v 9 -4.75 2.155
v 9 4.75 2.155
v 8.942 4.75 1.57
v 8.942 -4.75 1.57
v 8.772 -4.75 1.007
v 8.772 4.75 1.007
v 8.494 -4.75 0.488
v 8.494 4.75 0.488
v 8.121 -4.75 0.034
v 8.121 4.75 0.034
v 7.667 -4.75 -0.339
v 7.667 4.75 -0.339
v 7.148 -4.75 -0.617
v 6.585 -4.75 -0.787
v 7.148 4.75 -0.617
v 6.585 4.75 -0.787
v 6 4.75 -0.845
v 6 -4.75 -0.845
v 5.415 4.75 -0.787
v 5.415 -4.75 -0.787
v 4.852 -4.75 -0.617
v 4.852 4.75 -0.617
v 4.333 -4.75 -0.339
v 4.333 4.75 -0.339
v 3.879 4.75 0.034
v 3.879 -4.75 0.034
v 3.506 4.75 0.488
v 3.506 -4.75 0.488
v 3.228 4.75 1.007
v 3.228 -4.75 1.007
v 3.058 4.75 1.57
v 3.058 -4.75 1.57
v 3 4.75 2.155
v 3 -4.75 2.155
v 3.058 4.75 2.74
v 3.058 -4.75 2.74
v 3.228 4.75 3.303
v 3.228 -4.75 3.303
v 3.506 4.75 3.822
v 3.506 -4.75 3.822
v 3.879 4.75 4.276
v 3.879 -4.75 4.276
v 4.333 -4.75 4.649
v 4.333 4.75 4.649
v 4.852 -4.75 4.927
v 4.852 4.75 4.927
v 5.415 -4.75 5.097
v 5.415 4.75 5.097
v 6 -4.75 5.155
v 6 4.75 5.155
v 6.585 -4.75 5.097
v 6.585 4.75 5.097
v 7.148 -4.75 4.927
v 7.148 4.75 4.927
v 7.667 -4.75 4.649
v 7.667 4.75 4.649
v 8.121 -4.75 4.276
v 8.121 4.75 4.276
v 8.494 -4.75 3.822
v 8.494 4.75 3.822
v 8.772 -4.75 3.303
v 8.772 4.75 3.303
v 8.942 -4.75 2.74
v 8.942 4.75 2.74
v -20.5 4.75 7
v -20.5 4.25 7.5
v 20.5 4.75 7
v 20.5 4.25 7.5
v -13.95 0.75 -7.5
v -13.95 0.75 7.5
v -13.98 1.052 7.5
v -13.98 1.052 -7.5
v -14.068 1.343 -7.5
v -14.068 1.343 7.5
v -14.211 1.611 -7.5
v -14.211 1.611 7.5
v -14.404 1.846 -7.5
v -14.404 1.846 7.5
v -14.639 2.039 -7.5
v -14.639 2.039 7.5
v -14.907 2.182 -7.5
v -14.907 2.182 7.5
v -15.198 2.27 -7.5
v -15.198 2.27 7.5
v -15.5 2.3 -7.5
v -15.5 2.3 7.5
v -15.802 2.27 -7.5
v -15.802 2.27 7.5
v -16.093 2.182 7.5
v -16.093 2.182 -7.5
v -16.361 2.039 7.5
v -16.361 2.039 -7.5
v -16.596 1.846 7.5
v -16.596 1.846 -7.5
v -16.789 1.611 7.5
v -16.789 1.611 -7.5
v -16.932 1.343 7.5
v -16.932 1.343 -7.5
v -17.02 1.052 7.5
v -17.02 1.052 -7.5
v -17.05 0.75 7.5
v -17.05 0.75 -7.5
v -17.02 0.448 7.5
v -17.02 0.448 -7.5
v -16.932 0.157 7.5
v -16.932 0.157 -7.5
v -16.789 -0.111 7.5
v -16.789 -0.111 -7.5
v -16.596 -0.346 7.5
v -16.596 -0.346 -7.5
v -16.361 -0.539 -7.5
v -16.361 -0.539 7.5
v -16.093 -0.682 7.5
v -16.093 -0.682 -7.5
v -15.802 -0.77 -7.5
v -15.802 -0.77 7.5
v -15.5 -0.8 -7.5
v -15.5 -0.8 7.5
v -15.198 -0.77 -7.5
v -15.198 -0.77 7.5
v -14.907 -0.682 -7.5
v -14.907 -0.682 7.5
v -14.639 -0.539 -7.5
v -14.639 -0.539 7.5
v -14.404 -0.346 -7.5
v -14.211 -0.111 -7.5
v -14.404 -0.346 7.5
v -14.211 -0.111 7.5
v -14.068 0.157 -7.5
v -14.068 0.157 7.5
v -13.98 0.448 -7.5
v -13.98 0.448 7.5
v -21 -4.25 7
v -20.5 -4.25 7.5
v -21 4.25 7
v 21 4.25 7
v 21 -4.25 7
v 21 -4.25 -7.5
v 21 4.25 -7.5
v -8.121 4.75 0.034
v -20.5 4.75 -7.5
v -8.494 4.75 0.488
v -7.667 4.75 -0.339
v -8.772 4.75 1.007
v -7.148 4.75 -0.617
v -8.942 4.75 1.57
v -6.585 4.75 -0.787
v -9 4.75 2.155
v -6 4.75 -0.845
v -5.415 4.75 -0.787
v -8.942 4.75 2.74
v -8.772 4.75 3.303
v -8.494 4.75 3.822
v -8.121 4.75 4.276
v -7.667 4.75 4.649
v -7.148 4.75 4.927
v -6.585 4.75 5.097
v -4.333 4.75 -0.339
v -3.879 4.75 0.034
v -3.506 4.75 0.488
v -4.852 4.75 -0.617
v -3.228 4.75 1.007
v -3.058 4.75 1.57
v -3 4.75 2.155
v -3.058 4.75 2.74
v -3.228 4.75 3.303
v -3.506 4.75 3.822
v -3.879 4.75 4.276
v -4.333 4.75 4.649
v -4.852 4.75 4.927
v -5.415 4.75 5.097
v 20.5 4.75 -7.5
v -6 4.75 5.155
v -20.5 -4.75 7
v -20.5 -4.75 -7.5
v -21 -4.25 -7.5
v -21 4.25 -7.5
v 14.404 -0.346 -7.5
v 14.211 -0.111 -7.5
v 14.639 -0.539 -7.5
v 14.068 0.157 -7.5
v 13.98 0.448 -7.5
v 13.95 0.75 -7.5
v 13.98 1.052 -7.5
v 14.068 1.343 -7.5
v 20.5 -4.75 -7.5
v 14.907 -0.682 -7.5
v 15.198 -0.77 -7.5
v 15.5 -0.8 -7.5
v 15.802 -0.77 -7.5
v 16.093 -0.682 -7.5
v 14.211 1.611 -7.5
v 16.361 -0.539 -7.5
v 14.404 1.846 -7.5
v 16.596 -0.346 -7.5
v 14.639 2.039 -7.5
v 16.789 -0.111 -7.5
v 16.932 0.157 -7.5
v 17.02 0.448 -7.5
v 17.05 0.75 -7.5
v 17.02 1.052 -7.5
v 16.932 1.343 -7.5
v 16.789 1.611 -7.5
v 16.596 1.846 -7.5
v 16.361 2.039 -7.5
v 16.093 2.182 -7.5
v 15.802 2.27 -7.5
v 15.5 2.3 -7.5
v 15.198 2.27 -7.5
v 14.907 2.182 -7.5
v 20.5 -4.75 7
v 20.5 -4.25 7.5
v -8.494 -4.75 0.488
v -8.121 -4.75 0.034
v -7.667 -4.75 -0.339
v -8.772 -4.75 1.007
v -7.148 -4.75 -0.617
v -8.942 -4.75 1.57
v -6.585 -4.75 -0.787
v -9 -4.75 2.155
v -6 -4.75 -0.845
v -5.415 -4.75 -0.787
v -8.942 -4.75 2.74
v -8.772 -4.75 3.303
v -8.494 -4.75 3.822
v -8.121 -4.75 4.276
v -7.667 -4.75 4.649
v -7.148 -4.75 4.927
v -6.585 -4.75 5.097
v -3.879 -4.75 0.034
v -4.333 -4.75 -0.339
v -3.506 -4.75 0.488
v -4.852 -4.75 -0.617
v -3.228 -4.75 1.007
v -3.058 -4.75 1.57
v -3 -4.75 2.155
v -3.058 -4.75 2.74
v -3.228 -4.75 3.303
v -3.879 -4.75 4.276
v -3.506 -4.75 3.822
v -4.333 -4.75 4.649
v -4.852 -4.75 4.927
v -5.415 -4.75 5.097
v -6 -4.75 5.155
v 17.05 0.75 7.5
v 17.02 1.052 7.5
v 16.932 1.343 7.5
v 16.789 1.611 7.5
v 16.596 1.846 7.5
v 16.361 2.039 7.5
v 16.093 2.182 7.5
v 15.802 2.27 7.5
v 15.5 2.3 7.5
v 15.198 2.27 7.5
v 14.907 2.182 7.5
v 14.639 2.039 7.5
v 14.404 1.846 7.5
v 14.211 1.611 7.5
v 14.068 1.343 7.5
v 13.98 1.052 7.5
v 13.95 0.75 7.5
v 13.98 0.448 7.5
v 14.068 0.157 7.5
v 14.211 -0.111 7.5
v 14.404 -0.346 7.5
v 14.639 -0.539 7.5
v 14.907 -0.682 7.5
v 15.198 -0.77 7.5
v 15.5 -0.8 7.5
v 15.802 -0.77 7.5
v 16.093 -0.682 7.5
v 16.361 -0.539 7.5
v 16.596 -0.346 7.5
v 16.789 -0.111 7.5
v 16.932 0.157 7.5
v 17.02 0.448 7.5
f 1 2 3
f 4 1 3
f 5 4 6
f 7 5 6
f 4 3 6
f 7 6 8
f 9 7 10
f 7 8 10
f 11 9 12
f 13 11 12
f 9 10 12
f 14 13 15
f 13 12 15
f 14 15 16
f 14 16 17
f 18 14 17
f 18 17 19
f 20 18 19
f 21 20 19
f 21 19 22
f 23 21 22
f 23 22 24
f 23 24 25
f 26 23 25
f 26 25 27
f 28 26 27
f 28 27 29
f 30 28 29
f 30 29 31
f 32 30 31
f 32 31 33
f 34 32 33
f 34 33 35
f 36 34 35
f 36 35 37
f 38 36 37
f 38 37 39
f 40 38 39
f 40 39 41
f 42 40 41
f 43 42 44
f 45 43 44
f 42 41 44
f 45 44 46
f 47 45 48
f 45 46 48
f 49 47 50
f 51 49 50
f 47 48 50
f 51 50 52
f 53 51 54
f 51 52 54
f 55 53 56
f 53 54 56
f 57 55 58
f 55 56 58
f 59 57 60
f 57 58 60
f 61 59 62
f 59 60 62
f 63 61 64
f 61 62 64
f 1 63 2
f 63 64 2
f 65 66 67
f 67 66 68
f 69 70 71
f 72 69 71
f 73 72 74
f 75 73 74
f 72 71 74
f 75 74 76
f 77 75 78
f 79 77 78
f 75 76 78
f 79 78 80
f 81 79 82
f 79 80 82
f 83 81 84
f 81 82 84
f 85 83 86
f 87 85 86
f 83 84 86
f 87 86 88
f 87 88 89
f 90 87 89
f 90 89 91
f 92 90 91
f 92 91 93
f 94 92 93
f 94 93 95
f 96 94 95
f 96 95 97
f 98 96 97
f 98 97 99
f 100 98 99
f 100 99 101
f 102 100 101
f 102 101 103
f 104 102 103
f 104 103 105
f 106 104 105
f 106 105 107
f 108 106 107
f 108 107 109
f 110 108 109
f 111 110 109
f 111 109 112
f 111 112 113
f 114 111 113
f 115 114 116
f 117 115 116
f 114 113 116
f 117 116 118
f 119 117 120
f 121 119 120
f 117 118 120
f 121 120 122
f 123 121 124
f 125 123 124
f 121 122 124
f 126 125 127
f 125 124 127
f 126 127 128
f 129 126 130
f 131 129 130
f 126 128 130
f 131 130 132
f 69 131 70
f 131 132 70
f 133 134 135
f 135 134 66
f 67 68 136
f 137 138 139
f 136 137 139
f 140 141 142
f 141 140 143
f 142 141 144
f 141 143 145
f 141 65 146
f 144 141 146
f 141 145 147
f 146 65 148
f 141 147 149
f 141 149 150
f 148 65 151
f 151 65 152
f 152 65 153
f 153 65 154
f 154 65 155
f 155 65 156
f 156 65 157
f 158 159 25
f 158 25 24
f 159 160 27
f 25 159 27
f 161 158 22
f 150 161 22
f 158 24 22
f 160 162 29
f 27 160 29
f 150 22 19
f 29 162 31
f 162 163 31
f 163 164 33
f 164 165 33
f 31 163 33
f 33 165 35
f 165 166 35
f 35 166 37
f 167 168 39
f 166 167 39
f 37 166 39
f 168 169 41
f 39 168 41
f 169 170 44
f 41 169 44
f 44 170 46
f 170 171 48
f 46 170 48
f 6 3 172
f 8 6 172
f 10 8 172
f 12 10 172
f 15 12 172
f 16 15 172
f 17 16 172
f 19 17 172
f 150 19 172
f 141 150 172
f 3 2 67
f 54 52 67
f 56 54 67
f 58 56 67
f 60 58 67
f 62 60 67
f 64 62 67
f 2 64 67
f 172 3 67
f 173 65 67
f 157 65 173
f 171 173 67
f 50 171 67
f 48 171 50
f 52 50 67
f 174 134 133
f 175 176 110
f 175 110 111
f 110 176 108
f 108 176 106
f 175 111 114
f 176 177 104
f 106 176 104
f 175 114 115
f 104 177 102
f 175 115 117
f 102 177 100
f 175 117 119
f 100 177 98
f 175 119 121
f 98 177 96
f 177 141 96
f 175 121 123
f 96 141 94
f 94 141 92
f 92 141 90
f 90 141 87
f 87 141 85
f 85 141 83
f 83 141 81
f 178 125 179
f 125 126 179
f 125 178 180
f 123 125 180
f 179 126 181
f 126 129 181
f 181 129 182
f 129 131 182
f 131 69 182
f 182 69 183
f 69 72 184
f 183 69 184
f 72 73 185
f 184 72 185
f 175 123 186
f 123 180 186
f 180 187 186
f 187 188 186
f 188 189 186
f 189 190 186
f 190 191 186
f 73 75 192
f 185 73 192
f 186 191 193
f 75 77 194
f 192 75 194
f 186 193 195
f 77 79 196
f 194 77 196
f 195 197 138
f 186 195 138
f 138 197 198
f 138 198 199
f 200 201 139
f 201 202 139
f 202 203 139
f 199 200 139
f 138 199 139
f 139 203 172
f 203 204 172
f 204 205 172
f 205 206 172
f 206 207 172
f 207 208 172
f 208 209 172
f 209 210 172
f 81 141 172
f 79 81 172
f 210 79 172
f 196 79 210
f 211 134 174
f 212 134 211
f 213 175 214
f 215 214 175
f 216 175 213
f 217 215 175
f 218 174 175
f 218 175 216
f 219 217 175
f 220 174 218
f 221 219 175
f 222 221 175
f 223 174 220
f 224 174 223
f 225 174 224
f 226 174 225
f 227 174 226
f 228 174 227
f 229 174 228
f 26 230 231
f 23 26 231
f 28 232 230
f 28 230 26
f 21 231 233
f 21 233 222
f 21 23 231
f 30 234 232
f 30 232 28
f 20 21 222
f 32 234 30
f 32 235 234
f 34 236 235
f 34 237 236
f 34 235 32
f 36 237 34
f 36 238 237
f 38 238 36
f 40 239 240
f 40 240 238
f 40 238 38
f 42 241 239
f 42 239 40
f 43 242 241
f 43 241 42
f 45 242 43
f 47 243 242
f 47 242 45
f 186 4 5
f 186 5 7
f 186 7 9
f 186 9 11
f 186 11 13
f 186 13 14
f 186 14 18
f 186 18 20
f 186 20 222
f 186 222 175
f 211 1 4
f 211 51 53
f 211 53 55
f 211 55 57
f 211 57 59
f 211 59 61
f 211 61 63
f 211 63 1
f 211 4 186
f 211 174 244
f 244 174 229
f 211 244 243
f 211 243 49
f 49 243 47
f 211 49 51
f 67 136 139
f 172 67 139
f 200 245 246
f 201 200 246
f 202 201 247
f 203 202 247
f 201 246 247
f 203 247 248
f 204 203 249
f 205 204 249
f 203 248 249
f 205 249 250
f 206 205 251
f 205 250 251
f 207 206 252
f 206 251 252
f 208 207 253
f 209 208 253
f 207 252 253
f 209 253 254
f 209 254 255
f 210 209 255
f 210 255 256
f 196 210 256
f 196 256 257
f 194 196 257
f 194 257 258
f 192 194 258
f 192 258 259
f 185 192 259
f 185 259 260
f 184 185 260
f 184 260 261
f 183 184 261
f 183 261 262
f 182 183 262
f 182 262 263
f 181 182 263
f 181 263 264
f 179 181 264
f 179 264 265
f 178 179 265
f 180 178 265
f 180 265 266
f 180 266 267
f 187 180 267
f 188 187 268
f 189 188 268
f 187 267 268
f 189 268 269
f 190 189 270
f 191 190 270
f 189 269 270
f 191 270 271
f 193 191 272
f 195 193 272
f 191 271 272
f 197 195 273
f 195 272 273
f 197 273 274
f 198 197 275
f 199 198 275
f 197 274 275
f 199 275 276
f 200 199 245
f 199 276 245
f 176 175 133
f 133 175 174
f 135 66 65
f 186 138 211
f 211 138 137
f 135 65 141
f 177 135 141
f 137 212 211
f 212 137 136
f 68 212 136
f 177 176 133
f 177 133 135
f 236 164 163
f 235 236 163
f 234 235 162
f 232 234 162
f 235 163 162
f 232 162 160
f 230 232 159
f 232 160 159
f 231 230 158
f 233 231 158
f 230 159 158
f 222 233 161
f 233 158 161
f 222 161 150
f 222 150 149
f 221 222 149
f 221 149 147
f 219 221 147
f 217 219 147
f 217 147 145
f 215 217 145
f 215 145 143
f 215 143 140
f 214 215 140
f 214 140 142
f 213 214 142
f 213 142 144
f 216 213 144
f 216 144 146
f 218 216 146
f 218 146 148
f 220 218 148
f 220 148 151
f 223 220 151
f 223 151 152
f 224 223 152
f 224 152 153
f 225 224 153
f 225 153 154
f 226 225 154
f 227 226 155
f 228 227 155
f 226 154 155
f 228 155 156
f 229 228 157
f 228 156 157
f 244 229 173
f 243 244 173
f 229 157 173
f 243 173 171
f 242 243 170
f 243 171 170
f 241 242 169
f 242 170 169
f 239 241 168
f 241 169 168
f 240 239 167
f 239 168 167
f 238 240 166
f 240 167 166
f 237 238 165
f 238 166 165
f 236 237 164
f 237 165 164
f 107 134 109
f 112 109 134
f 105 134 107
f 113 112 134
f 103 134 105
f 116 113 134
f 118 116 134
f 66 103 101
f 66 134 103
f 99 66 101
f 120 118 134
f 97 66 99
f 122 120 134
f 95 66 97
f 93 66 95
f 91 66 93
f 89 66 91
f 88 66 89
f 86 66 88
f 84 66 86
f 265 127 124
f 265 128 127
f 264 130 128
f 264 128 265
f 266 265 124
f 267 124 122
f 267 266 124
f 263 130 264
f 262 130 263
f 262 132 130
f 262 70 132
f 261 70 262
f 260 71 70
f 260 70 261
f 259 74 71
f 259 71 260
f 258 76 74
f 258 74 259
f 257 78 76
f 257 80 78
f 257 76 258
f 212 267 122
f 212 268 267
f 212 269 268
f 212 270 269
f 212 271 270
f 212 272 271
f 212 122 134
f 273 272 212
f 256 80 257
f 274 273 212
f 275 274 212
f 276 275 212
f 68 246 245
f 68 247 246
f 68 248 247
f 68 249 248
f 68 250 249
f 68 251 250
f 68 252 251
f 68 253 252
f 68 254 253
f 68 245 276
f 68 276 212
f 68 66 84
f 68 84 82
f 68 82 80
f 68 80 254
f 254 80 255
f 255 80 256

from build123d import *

# Parameters (mm, degrees)
SKETCH1_W           = 42
SKETCH1_H           = 9.5
BOSS_EXTRUDE1_DEPTH = 7.5
SKETCH2_R           = 1.55
CUT_EXTRUDE1_DEPTH  = 16
SKETCH4_R           = 3
CUT_EXTRUDE2_DEPTH  = 10.5
CHAMFER3_SIZE       = 0.5


with BuildPart() as part:
    # Sketch1 → Boss-Extrude1 (new body, symmetric)
    with BuildSketch(Plane.XY):
        Rectangle(SKETCH1_W, SKETCH1_H)
    extrude(amount=BOSS_EXTRUDE1_DEPTH, both=True)

    # Sketch2 → Cut-Extrude1 (cut, through all)
    with BuildSketch(Plane.XY.offset(7.5)):
        with Locations((-15.5, 0.75)):
            Circle(SKETCH2_R)
        with Locations((15.5, 0.75)):
            Circle(SKETCH2_R)
    extrude(amount=-CUT_EXTRUDE1_DEPTH, mode=Mode.SUBTRACT)

    # Sketch4 → Cut-Extrude2 (cut, through all)
    with BuildSketch(Plane(origin=(0, 4.75, 0), x_dir=(1, 0, 0), z_dir=(0, 1, 0))):
        with Locations((6, -2.155)):
            Circle(SKETCH4_R)
        with Locations((-6, -2.155)):
            Circle(SKETCH4_R)
    extrude(amount=-CUT_EXTRUDE2_DEPTH, mode=Mode.SUBTRACT)

    # Chamfer3
    chamfer3_edges = [part.edges().sort_by_distance(p)[0] for p in [
        (-21, 0, 7.5),
        (0, -4.75, 7.5),
        (21, 0, 7.5),
        (0, 4.75, 7.5),
        (21, -4.75, 0),
        (-21, -4.75, 0),
        (-21, 4.75, 0),
        (21, 4.75, 0),
    ]]
    chamfer(chamfer3_edges, length=CHAMFER3_SIZE)


solid = part.part
